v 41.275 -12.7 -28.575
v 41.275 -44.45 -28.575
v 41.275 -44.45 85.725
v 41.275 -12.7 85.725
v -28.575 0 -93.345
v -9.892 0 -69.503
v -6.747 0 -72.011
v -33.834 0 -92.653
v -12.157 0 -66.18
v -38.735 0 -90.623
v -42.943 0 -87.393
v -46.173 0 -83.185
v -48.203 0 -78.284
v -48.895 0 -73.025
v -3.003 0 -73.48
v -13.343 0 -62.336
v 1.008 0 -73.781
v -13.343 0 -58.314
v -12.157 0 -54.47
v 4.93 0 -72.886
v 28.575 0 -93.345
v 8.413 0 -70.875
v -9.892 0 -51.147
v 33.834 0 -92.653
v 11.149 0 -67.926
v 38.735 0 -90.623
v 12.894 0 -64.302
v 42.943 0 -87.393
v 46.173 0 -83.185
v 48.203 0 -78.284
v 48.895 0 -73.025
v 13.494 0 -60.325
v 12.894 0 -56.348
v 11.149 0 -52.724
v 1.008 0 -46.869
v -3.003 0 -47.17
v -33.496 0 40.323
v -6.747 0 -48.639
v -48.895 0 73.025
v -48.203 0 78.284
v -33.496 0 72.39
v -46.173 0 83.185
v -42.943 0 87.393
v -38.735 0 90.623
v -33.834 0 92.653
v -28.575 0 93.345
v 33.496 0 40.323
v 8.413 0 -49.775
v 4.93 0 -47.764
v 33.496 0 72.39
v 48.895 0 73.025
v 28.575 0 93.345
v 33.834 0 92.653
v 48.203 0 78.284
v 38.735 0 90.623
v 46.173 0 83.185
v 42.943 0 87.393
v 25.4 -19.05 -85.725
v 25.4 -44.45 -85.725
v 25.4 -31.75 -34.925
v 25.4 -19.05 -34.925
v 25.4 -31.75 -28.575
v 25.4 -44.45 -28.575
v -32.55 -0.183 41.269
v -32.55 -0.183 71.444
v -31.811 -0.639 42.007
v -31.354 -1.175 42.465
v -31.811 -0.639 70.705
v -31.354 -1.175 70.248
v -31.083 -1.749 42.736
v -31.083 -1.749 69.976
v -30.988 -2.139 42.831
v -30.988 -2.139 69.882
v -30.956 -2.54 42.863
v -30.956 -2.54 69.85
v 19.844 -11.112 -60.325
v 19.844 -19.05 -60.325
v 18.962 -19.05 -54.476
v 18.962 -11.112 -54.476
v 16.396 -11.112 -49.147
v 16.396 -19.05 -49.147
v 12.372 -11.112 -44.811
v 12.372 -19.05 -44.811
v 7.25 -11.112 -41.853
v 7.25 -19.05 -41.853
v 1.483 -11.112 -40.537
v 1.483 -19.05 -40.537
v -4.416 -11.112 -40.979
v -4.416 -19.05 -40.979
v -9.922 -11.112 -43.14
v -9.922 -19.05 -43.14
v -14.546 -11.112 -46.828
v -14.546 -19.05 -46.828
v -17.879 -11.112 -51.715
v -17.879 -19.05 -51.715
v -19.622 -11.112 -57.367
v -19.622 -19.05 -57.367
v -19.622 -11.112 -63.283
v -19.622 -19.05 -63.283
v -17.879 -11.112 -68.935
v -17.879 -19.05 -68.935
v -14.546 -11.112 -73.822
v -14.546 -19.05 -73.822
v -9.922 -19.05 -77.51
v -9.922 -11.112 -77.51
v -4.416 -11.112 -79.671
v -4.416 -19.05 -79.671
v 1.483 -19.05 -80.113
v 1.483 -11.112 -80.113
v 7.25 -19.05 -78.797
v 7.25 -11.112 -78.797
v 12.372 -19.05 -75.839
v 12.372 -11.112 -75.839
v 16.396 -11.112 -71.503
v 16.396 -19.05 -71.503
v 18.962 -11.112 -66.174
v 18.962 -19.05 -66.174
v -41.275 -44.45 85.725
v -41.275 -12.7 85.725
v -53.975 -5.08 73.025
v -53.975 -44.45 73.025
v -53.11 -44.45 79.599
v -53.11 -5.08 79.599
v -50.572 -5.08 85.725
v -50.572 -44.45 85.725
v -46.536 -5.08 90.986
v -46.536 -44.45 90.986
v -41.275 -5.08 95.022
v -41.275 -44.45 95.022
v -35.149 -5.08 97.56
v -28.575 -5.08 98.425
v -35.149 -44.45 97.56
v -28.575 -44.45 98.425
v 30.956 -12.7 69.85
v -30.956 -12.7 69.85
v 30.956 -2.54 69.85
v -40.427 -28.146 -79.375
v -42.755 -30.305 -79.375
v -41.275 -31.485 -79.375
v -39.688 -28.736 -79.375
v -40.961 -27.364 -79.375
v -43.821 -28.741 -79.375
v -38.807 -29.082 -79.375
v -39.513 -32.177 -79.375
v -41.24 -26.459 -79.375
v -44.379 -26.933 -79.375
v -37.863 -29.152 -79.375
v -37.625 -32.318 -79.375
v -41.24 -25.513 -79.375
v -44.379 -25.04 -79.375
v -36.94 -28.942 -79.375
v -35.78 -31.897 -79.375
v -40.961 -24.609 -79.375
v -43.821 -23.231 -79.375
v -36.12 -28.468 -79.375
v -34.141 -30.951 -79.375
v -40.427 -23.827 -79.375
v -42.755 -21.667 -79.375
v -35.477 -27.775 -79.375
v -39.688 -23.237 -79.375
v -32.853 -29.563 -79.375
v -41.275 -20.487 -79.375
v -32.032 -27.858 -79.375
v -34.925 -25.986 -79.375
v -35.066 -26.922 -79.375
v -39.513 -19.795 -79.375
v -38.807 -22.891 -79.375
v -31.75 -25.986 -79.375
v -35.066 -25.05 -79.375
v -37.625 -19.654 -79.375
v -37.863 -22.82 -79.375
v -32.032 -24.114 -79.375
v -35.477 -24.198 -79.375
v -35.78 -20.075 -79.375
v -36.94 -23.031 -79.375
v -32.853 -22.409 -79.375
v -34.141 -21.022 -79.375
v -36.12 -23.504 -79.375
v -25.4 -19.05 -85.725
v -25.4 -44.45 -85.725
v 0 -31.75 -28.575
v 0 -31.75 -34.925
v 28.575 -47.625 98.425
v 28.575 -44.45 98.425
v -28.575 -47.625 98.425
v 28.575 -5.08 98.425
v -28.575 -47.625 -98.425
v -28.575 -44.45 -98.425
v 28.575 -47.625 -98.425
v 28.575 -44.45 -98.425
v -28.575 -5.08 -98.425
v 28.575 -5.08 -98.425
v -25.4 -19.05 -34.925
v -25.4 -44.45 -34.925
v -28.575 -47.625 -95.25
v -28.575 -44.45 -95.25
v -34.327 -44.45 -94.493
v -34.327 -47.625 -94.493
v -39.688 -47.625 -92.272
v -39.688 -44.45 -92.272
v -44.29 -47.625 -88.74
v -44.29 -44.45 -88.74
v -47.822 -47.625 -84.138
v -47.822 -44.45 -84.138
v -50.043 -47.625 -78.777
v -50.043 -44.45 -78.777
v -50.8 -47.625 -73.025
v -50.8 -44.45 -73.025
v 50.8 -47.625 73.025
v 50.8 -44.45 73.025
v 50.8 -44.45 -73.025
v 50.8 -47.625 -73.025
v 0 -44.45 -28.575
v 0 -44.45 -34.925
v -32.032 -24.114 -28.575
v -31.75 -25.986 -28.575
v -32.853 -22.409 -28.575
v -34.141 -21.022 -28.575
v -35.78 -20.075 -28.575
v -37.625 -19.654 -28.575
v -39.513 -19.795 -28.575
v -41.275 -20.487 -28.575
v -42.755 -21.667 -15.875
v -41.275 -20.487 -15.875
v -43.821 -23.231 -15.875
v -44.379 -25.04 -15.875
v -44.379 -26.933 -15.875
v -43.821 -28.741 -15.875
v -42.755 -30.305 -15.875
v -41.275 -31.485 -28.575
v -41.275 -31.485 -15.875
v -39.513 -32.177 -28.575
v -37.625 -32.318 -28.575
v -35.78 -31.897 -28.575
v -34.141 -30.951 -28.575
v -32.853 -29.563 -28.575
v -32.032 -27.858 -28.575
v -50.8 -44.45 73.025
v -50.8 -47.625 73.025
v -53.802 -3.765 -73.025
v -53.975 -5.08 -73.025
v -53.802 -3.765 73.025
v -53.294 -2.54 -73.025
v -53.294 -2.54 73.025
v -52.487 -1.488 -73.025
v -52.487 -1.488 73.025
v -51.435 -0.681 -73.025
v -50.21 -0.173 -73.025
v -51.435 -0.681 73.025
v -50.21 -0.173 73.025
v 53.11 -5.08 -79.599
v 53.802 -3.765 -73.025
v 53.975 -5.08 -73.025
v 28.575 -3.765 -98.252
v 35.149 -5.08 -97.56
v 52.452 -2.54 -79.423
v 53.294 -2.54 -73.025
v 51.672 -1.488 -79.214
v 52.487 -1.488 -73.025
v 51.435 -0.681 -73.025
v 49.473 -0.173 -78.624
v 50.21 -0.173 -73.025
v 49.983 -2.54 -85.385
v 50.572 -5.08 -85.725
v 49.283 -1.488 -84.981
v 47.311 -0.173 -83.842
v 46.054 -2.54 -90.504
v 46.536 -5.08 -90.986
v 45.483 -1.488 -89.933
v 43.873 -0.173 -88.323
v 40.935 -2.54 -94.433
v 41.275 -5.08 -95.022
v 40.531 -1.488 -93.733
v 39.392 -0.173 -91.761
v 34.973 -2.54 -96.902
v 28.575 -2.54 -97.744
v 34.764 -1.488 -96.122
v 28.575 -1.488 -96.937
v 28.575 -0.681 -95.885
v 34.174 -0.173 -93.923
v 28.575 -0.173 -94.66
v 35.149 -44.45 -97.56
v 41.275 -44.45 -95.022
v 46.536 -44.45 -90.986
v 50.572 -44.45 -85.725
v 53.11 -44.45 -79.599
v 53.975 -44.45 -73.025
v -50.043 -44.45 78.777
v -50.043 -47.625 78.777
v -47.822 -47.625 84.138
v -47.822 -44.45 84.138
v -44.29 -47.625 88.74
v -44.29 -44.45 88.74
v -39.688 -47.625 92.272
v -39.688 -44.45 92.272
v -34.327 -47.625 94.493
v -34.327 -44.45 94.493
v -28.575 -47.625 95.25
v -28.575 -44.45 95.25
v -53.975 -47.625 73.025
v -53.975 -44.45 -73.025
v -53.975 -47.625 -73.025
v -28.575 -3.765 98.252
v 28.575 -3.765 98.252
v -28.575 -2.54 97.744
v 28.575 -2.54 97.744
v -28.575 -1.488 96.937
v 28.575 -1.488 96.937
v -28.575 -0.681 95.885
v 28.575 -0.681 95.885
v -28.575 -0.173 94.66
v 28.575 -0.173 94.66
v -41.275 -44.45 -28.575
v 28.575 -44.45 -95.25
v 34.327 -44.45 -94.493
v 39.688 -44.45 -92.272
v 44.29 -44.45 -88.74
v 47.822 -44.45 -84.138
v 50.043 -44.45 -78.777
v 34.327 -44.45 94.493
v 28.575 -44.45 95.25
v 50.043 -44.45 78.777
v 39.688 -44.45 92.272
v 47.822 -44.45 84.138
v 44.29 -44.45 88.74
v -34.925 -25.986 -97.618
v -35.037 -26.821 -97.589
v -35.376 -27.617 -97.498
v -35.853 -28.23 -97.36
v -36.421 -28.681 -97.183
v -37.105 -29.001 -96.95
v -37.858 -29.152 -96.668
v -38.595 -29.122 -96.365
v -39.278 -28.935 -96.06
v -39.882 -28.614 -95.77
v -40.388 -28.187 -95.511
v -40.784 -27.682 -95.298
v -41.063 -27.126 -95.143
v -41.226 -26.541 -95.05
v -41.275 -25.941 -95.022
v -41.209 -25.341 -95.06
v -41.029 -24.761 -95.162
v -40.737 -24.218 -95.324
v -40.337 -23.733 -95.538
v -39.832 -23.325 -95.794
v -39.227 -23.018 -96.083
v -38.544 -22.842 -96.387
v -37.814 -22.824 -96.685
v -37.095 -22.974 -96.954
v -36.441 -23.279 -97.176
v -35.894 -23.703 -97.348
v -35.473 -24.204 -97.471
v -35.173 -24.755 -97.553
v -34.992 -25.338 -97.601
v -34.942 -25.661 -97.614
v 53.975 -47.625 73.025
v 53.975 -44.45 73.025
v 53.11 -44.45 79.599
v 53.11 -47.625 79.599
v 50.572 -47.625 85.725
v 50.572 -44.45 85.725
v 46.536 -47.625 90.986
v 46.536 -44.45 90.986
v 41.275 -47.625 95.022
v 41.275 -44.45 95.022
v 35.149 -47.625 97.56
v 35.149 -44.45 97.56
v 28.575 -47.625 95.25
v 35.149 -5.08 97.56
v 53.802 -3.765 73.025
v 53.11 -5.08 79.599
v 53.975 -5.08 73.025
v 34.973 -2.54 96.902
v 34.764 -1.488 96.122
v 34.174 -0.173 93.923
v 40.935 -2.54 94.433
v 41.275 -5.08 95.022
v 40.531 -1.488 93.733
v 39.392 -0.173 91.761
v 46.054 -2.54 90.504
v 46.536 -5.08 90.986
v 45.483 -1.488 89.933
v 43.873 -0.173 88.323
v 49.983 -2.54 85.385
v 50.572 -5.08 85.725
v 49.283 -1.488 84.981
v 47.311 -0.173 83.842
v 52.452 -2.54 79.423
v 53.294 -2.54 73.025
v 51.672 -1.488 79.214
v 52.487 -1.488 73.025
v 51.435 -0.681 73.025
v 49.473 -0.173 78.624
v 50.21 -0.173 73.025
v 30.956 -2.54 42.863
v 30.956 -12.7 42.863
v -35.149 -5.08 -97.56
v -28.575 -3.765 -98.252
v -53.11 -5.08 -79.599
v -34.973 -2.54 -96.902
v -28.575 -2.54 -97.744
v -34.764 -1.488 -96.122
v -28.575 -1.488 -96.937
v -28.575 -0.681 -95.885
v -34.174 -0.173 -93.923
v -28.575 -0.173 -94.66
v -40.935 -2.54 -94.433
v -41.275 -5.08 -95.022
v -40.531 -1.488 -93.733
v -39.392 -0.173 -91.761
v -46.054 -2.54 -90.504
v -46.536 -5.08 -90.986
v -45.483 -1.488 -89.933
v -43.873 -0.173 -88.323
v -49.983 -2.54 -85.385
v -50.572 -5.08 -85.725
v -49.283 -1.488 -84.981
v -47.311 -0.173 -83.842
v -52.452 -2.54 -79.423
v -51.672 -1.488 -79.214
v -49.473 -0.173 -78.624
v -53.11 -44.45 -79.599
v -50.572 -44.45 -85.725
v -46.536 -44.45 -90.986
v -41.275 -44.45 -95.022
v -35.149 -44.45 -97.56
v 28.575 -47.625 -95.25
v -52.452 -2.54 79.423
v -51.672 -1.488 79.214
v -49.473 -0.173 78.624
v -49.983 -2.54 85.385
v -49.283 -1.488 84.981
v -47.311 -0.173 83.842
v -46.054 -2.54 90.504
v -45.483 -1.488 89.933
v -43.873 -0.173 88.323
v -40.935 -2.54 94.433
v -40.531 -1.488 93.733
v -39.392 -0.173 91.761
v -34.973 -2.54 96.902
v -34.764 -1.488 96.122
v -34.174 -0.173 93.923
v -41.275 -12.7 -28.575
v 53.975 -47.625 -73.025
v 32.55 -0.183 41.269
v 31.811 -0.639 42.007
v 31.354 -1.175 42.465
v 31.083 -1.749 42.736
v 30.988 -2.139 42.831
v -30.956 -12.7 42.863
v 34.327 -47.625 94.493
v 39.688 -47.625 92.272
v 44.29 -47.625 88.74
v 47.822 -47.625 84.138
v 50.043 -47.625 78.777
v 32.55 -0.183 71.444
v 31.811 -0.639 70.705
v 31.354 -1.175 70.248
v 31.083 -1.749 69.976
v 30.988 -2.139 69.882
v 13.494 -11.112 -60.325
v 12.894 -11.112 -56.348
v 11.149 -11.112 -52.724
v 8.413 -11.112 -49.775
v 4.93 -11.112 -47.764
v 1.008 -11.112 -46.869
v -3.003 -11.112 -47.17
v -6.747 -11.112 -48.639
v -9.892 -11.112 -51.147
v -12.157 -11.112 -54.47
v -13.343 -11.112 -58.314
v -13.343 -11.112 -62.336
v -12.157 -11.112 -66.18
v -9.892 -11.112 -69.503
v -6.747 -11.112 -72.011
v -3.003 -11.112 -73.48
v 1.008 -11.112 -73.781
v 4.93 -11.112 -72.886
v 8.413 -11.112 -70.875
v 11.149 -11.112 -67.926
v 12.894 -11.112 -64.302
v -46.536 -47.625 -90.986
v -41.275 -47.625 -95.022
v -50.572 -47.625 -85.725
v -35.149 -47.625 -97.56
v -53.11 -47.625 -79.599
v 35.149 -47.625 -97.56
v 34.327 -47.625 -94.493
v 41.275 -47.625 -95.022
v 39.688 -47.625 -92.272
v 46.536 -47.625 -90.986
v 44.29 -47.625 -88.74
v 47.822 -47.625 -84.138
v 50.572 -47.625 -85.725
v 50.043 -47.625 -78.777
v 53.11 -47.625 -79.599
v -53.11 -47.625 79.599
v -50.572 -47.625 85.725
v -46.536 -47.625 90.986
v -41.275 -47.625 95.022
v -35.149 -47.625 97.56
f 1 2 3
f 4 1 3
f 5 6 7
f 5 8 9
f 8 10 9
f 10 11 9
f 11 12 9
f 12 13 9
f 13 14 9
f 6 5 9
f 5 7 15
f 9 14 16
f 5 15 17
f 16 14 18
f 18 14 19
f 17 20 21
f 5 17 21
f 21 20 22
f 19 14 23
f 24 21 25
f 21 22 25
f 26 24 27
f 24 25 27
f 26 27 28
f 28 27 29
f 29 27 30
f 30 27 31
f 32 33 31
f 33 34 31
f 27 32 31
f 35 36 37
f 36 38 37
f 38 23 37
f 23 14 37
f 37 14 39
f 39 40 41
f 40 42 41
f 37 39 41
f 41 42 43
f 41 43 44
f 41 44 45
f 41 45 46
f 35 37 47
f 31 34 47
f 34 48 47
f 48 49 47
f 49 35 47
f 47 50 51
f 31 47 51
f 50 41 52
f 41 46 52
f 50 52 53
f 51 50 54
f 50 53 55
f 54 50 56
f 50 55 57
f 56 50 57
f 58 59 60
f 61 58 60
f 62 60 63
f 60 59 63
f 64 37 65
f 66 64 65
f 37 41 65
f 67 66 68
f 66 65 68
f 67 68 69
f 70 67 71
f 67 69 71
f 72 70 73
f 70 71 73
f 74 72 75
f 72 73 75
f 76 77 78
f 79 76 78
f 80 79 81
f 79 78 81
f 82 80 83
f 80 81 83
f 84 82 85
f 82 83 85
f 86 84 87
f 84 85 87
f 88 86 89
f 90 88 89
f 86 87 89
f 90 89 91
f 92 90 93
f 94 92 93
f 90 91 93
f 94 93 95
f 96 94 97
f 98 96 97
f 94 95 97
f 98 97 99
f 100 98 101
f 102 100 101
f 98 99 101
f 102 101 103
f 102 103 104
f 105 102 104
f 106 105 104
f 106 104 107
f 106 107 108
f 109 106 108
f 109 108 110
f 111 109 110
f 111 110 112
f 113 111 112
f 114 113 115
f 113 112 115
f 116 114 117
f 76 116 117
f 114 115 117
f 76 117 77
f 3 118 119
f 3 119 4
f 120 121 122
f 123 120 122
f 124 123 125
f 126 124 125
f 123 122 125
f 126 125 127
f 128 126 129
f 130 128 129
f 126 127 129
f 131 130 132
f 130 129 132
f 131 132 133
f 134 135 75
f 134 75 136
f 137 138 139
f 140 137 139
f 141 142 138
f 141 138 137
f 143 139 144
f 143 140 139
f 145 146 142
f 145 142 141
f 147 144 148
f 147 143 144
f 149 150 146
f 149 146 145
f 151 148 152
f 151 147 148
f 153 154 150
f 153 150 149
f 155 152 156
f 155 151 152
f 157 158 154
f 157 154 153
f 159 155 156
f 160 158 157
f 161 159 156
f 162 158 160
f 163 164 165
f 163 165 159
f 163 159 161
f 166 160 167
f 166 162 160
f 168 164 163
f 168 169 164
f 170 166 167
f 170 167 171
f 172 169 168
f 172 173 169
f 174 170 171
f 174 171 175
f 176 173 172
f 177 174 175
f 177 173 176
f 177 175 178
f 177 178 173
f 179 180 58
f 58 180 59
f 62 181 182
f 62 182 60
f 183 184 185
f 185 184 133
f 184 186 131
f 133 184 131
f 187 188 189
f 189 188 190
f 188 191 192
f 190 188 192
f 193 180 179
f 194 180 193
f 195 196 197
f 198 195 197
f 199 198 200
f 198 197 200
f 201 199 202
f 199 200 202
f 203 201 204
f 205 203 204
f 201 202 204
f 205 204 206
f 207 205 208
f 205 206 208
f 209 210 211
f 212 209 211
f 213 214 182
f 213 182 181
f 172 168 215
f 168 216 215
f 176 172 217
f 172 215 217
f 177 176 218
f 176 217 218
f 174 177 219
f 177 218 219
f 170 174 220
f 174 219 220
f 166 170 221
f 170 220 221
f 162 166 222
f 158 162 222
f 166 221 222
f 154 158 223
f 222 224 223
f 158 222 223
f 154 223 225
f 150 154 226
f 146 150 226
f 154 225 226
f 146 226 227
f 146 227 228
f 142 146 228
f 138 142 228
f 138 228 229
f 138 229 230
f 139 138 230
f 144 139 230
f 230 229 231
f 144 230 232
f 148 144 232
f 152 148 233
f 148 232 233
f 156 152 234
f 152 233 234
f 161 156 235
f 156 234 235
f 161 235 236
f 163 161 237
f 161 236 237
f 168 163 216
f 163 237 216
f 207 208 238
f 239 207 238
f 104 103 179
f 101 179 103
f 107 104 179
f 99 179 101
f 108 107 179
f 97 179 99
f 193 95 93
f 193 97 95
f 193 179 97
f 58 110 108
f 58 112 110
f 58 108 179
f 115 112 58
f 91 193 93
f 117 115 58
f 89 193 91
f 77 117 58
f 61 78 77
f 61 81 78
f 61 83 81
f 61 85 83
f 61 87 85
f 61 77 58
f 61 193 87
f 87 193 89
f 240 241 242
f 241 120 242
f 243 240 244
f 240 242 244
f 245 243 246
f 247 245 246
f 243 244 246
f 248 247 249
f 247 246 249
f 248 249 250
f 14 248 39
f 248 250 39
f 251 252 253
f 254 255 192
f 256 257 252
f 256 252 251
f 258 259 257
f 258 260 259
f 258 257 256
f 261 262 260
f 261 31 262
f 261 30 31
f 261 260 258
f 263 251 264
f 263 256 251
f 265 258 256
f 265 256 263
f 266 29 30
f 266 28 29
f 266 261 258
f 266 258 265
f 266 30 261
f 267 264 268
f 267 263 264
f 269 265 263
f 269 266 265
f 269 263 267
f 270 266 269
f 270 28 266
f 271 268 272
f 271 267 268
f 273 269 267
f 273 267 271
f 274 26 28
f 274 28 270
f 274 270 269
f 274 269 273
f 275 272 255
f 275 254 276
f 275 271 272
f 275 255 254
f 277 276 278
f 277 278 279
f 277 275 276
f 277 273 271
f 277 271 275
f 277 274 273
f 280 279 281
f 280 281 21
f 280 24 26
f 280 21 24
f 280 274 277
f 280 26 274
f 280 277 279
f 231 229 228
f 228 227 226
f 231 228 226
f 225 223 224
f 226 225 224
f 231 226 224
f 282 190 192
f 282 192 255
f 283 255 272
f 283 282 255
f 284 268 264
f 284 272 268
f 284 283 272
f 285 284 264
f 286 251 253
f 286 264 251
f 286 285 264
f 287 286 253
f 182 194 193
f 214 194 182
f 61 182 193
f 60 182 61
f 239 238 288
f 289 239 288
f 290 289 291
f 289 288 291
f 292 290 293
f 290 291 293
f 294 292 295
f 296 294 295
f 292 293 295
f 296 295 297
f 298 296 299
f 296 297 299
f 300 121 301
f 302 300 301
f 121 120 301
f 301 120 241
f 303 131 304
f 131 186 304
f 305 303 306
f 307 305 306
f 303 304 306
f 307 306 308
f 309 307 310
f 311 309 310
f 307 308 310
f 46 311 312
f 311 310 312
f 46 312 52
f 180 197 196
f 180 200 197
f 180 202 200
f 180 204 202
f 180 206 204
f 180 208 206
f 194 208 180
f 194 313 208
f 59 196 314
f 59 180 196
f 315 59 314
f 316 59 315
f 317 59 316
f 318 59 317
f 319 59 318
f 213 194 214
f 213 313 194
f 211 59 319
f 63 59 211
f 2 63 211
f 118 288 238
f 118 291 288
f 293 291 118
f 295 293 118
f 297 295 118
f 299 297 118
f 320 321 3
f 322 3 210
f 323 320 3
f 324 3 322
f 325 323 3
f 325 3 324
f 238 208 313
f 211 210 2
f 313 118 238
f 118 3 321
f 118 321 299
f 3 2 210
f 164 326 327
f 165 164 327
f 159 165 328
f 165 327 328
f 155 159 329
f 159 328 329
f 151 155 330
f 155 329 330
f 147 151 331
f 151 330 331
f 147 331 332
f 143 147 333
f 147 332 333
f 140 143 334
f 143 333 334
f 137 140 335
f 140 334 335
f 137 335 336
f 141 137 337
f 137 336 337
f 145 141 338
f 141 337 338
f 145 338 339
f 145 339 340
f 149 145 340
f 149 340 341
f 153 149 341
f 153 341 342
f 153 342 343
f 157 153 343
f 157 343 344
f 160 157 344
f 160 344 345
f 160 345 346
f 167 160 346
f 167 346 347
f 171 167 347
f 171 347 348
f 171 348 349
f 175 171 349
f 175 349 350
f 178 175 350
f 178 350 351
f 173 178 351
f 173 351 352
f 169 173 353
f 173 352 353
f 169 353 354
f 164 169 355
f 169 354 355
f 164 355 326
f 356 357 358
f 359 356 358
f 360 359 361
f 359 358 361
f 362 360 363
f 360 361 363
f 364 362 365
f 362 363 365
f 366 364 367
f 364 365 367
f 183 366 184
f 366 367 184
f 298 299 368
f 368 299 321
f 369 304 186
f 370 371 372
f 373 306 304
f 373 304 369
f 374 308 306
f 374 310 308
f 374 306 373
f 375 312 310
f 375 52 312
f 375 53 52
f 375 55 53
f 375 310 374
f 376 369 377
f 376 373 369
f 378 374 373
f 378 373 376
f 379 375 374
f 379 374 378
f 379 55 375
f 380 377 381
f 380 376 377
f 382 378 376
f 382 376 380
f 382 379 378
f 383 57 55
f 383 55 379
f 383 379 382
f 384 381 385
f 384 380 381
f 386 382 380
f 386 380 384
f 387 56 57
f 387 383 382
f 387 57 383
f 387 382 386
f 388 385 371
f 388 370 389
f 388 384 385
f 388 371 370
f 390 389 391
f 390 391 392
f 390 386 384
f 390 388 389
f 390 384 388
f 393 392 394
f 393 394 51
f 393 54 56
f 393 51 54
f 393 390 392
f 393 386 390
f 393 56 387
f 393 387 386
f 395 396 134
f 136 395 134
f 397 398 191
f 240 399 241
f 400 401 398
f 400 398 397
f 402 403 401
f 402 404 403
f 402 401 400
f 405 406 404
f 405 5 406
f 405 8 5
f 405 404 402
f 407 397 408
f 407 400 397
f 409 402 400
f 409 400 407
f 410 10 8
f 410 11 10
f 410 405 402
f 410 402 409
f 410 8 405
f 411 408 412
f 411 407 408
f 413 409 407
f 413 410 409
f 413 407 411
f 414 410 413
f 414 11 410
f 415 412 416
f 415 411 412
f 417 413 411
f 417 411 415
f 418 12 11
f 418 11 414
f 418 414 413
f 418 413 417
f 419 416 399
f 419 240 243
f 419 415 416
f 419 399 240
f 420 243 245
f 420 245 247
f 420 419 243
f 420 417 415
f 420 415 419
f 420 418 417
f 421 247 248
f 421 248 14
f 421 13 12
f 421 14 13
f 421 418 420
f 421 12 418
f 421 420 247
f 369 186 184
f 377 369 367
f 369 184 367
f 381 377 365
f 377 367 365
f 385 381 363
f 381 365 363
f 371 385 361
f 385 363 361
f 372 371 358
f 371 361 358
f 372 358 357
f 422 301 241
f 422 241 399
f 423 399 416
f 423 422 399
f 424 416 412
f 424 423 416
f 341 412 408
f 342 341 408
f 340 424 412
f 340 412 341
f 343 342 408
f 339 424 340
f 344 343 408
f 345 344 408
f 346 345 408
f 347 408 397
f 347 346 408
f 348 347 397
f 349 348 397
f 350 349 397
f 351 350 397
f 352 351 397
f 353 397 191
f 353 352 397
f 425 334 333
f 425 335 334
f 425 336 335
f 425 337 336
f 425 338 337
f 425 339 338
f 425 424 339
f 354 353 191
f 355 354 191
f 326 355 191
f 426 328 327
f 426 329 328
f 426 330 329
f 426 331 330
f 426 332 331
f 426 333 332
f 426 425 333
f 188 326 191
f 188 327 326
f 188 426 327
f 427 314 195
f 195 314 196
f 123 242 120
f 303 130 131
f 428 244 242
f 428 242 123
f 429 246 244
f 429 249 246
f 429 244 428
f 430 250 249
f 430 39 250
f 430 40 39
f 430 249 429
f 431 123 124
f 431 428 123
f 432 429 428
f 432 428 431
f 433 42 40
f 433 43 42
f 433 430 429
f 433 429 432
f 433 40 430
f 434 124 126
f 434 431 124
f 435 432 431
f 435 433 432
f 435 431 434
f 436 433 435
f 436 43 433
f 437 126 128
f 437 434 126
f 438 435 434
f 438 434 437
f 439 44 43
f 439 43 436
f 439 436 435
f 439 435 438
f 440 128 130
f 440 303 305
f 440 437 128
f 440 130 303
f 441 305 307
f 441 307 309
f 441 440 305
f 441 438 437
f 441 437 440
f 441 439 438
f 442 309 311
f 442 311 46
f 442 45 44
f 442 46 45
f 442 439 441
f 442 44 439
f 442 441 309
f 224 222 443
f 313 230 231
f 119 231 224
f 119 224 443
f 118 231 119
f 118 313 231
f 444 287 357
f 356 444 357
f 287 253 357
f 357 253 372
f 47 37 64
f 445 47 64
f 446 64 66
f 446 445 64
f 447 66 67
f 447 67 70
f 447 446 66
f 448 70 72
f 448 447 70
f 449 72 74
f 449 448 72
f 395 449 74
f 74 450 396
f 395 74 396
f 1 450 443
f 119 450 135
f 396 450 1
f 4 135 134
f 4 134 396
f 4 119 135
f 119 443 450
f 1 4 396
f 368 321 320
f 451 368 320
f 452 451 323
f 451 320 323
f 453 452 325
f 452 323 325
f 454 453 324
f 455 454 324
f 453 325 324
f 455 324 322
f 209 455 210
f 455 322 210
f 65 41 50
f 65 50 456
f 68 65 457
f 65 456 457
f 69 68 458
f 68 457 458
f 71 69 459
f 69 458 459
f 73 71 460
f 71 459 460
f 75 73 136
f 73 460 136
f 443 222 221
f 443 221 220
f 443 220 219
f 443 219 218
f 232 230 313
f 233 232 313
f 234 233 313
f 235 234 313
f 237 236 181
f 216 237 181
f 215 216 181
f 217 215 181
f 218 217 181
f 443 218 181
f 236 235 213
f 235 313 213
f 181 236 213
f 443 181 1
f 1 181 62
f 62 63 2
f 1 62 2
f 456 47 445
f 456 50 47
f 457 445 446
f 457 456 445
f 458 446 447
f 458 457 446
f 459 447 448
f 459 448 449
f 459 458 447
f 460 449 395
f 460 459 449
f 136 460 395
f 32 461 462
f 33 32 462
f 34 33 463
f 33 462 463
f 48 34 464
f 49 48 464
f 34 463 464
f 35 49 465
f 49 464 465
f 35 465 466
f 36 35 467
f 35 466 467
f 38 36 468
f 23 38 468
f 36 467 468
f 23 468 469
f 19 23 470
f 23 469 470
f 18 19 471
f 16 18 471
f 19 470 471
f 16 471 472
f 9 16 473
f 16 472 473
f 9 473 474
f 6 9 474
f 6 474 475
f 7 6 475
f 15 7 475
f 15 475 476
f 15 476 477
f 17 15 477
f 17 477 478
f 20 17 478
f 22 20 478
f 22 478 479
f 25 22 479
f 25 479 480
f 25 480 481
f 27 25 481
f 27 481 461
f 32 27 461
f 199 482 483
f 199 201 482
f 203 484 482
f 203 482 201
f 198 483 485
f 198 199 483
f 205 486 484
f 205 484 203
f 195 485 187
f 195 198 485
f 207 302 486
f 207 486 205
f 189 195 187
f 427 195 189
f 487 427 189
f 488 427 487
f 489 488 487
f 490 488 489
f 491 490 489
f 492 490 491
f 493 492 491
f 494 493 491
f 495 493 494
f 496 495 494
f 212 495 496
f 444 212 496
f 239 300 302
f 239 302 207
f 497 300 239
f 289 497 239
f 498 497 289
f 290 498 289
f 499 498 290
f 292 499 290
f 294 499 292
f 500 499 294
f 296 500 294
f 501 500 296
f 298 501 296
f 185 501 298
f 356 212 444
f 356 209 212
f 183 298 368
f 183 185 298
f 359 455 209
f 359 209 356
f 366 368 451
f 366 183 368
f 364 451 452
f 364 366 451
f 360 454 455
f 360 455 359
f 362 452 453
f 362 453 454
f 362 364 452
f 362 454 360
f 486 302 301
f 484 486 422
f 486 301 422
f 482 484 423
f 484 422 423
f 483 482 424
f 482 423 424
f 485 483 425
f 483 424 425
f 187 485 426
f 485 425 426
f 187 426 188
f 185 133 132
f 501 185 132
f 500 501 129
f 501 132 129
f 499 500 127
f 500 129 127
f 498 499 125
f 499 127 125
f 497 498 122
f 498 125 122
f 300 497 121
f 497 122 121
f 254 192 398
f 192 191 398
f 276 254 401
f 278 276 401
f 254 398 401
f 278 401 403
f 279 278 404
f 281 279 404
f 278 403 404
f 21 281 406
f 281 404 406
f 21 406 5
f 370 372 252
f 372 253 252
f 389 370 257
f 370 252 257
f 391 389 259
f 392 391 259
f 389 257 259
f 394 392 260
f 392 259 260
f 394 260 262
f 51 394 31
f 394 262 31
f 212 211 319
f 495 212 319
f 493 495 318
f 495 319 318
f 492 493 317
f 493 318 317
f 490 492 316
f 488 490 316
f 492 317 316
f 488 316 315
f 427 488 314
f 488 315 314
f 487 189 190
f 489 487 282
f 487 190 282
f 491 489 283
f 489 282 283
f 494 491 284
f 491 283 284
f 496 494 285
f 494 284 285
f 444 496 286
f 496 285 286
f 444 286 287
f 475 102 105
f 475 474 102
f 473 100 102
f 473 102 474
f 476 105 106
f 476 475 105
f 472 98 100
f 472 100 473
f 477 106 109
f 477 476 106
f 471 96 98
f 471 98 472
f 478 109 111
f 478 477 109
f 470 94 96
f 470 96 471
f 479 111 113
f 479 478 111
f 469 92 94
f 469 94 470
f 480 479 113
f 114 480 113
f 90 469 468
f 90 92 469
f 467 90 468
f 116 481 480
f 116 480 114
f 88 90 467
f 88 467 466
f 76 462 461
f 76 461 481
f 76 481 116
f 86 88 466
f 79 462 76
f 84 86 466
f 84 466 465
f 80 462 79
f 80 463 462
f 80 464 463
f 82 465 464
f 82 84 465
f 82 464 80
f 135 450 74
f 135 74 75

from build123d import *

# Parameters (mm, degrees)
F0_W      = 107.95
F0_H      = 196.85
F1_DEPTH  = 44.45
F2_W      = 82.55
F2_H      = 114.3
F3_DEPTH  = 31.75
F4_W      = 61.9125
F4_H      = 26.9875
F5_DEPTH  = 25.4
F6_W      = 50.8
F6_H      = 50.8
F7_DEPTH  = 25.4
F8_R      = 19.84375
F9_DEPTH  = 7.9375
F10_R     = 13.49375
F11_DEPTH = 25.4
F12_R     = 25.4
F13_R     = 5.08
F14_R     = 2.54
F16_DEPTH = 3.175
F17_R     = 3.175
F18_DEPTH = 76.2
F19_R     = 6.35
F20_DEPTH = 50.8
F21_DEPTH = 12.7
F22_W     = 25.4
F22_H     = 6.35
F23_DEPTH = 12.7


with BuildPart() as f1:
    # F0 (on Front) → F1 (new body)
    with BuildSketch(Plane.XZ):
        Rectangle(F0_W, F0_H)
    extrude(amount=F1_DEPTH)

    # F2 (on face) → F3 (cut)
    with BuildSketch(Plane.XZ.offset(44.45)):
        with Locations((0, 28.575)):
            Rectangle(F2_W, F2_H)
    extrude(amount=-F3_DEPTH, mode=Mode.SUBTRACT)

    # F4 (on face) → F5 (cut)
    with BuildSketch(Plane.XZ.offset(12.7)):
        with Locations((0, 56.35625)):
            Rectangle(F4_W, F4_H)
    extrude(amount=-F5_DEPTH, mode=Mode.SUBTRACT)

    # F6 (on face) → F7 (cut)
    with BuildSketch(Plane.XZ.offset(44.45)):
        with Locations((0, -60.325)):
            Rectangle(F6_W, F6_H)
    extrude(amount=-F7_DEPTH, mode=Mode.SUBTRACT)

    # F8 (on face) → F9 (cut)
    with BuildSketch(Plane.XZ.offset(19.05)):
        with Locations((0, -60.325)):
            Circle(F8_R)
    extrude(amount=-F9_DEPTH, mode=Mode.SUBTRACT)

    # F10 (on face) → F11 (cut)
    with BuildSketch(Plane.XZ.offset(11.1125)):
        with Locations((0, -60.325)):
            Circle(F10_R)
    extrude(amount=-F11_DEPTH, mode=Mode.SUBTRACT)

    # F12
    f12_edges = [f1.edges().sort_by_distance(p)[0] for p in [
        (53.975, -22.225, 98.425),
        (53.975, -22.225, -98.425),
        (-53.975, -22.225, -98.425),
        (-53.975, -22.225, 98.425),
    ]]
    fillet(f12_edges, radius=F12_R)

    # F13
    f13_edges = [f1.edges().sort_by_distance(p)[0] for p in [
        (-53.975, 0, 0),
        (-46.535512, 0, -90.985512),
        (0, 0, -98.425),
    ]]
    fillet(f13_edges, radius=F13_R)

    # F14
    f14_edges = [f1.edges().sort_by_distance(p)[0] for p in [
        (0, 0, 69.85),
        (30.95625, 0, 56.35625),
        (0, 0, 42.8625),
        (-30.95625, 0, 56.35625),
    ]]
    fillet(f14_edges, radius=F14_R)

    # F15 (on face) → F16 (join)
    with BuildSketch(Plane.XZ.offset(44.45)):
        with BuildLine():
            ThreePointArc((53.975, 73.025), (46.5355122421, 90.9855122421), (28.575, 98.425))
            Line((28.575, 98.425), (-28.575, 98.425))
            ThreePointArc((-28.575, 98.425), (-46.5355122421, 90.9855122421), (-53.975, 73.025))
            Line((-53.975, 73.025), (-53.975, -73.025))
            ThreePointArc((-53.975, -73.025), (-46.5355122421, -90.9855122421), (-28.575, -98.425))
            Line((-28.575, -98.425), (28.575, -98.425))
            ThreePointArc((28.575, -98.425), (46.5355122421, -90.9855122421), (53.975, -73.025))
            Line((53.975, -73.025), (53.975, 73.025))
        make_face()
        with BuildLine():
            ThreePointArc((28.575, 95.25), (44.2904482119, 88.7404482119), (50.8, 73.025))
            Line((50.8, 73.025), (50.8, -73.025))
            ThreePointArc((50.8, -73.025), (44.2904482119, -88.7404482119), (28.575, -95.25))
            Line((28.575, -95.25), (-28.575, -95.25))
            ThreePointArc((-28.575, -95.25), (-44.2904482119, -88.7404482119), (-50.8, -73.025))
            Line((-50.8, -73.025), (-50.8, 73.025))
            ThreePointArc((-50.8, 73.025), (-44.2904482119, 88.7404482119), (-28.575, 95.25))
            Line((-28.575, 95.25), (28.575, 95.25))
        make_face(mode=Mode.SUBTRACT)
    extrude(amount=F16_DEPTH)

    # F17 (on face) → F18 (cut)
    with BuildSketch(Plane(origin=(0, 0, -98.425), x_dir=(1, 0, 0), z_dir=(0, 0, -1))):
        with Locations((-38.1, 25.986155495)):
            Circle(F17_R)
    extrude(amount=-F18_DEPTH, mode=Mode.SUBTRACT)

    # F19 (on face) → F20 (cut)
    with BuildSketch(Plane.XY.offset(-28.575)):
        with Locations((-38.1, -25.986155495)):
            Circle(F19_R)
    extrude(amount=-F20_DEPTH, mode=Mode.SUBTRACT)

    # F19 (on face) → F21 (cut)
    with BuildSketch(Plane.XY.offset(-28.575)):
        with Locations((-38.1, -25.986155495)):
            Circle(F19_R)
    extrude(amount=F21_DEPTH, mode=Mode.SUBTRACT)

    # F22 (on face) → F23 (cut)
    with BuildSketch(Plane.XZ.offset(44.45)):
        with Locations((12.7, -31.75)):
            Rectangle(F22_W, F22_H)
    extrude(amount=-F23_DEPTH, mode=Mode.SUBTRACT)


solid = f1.part
